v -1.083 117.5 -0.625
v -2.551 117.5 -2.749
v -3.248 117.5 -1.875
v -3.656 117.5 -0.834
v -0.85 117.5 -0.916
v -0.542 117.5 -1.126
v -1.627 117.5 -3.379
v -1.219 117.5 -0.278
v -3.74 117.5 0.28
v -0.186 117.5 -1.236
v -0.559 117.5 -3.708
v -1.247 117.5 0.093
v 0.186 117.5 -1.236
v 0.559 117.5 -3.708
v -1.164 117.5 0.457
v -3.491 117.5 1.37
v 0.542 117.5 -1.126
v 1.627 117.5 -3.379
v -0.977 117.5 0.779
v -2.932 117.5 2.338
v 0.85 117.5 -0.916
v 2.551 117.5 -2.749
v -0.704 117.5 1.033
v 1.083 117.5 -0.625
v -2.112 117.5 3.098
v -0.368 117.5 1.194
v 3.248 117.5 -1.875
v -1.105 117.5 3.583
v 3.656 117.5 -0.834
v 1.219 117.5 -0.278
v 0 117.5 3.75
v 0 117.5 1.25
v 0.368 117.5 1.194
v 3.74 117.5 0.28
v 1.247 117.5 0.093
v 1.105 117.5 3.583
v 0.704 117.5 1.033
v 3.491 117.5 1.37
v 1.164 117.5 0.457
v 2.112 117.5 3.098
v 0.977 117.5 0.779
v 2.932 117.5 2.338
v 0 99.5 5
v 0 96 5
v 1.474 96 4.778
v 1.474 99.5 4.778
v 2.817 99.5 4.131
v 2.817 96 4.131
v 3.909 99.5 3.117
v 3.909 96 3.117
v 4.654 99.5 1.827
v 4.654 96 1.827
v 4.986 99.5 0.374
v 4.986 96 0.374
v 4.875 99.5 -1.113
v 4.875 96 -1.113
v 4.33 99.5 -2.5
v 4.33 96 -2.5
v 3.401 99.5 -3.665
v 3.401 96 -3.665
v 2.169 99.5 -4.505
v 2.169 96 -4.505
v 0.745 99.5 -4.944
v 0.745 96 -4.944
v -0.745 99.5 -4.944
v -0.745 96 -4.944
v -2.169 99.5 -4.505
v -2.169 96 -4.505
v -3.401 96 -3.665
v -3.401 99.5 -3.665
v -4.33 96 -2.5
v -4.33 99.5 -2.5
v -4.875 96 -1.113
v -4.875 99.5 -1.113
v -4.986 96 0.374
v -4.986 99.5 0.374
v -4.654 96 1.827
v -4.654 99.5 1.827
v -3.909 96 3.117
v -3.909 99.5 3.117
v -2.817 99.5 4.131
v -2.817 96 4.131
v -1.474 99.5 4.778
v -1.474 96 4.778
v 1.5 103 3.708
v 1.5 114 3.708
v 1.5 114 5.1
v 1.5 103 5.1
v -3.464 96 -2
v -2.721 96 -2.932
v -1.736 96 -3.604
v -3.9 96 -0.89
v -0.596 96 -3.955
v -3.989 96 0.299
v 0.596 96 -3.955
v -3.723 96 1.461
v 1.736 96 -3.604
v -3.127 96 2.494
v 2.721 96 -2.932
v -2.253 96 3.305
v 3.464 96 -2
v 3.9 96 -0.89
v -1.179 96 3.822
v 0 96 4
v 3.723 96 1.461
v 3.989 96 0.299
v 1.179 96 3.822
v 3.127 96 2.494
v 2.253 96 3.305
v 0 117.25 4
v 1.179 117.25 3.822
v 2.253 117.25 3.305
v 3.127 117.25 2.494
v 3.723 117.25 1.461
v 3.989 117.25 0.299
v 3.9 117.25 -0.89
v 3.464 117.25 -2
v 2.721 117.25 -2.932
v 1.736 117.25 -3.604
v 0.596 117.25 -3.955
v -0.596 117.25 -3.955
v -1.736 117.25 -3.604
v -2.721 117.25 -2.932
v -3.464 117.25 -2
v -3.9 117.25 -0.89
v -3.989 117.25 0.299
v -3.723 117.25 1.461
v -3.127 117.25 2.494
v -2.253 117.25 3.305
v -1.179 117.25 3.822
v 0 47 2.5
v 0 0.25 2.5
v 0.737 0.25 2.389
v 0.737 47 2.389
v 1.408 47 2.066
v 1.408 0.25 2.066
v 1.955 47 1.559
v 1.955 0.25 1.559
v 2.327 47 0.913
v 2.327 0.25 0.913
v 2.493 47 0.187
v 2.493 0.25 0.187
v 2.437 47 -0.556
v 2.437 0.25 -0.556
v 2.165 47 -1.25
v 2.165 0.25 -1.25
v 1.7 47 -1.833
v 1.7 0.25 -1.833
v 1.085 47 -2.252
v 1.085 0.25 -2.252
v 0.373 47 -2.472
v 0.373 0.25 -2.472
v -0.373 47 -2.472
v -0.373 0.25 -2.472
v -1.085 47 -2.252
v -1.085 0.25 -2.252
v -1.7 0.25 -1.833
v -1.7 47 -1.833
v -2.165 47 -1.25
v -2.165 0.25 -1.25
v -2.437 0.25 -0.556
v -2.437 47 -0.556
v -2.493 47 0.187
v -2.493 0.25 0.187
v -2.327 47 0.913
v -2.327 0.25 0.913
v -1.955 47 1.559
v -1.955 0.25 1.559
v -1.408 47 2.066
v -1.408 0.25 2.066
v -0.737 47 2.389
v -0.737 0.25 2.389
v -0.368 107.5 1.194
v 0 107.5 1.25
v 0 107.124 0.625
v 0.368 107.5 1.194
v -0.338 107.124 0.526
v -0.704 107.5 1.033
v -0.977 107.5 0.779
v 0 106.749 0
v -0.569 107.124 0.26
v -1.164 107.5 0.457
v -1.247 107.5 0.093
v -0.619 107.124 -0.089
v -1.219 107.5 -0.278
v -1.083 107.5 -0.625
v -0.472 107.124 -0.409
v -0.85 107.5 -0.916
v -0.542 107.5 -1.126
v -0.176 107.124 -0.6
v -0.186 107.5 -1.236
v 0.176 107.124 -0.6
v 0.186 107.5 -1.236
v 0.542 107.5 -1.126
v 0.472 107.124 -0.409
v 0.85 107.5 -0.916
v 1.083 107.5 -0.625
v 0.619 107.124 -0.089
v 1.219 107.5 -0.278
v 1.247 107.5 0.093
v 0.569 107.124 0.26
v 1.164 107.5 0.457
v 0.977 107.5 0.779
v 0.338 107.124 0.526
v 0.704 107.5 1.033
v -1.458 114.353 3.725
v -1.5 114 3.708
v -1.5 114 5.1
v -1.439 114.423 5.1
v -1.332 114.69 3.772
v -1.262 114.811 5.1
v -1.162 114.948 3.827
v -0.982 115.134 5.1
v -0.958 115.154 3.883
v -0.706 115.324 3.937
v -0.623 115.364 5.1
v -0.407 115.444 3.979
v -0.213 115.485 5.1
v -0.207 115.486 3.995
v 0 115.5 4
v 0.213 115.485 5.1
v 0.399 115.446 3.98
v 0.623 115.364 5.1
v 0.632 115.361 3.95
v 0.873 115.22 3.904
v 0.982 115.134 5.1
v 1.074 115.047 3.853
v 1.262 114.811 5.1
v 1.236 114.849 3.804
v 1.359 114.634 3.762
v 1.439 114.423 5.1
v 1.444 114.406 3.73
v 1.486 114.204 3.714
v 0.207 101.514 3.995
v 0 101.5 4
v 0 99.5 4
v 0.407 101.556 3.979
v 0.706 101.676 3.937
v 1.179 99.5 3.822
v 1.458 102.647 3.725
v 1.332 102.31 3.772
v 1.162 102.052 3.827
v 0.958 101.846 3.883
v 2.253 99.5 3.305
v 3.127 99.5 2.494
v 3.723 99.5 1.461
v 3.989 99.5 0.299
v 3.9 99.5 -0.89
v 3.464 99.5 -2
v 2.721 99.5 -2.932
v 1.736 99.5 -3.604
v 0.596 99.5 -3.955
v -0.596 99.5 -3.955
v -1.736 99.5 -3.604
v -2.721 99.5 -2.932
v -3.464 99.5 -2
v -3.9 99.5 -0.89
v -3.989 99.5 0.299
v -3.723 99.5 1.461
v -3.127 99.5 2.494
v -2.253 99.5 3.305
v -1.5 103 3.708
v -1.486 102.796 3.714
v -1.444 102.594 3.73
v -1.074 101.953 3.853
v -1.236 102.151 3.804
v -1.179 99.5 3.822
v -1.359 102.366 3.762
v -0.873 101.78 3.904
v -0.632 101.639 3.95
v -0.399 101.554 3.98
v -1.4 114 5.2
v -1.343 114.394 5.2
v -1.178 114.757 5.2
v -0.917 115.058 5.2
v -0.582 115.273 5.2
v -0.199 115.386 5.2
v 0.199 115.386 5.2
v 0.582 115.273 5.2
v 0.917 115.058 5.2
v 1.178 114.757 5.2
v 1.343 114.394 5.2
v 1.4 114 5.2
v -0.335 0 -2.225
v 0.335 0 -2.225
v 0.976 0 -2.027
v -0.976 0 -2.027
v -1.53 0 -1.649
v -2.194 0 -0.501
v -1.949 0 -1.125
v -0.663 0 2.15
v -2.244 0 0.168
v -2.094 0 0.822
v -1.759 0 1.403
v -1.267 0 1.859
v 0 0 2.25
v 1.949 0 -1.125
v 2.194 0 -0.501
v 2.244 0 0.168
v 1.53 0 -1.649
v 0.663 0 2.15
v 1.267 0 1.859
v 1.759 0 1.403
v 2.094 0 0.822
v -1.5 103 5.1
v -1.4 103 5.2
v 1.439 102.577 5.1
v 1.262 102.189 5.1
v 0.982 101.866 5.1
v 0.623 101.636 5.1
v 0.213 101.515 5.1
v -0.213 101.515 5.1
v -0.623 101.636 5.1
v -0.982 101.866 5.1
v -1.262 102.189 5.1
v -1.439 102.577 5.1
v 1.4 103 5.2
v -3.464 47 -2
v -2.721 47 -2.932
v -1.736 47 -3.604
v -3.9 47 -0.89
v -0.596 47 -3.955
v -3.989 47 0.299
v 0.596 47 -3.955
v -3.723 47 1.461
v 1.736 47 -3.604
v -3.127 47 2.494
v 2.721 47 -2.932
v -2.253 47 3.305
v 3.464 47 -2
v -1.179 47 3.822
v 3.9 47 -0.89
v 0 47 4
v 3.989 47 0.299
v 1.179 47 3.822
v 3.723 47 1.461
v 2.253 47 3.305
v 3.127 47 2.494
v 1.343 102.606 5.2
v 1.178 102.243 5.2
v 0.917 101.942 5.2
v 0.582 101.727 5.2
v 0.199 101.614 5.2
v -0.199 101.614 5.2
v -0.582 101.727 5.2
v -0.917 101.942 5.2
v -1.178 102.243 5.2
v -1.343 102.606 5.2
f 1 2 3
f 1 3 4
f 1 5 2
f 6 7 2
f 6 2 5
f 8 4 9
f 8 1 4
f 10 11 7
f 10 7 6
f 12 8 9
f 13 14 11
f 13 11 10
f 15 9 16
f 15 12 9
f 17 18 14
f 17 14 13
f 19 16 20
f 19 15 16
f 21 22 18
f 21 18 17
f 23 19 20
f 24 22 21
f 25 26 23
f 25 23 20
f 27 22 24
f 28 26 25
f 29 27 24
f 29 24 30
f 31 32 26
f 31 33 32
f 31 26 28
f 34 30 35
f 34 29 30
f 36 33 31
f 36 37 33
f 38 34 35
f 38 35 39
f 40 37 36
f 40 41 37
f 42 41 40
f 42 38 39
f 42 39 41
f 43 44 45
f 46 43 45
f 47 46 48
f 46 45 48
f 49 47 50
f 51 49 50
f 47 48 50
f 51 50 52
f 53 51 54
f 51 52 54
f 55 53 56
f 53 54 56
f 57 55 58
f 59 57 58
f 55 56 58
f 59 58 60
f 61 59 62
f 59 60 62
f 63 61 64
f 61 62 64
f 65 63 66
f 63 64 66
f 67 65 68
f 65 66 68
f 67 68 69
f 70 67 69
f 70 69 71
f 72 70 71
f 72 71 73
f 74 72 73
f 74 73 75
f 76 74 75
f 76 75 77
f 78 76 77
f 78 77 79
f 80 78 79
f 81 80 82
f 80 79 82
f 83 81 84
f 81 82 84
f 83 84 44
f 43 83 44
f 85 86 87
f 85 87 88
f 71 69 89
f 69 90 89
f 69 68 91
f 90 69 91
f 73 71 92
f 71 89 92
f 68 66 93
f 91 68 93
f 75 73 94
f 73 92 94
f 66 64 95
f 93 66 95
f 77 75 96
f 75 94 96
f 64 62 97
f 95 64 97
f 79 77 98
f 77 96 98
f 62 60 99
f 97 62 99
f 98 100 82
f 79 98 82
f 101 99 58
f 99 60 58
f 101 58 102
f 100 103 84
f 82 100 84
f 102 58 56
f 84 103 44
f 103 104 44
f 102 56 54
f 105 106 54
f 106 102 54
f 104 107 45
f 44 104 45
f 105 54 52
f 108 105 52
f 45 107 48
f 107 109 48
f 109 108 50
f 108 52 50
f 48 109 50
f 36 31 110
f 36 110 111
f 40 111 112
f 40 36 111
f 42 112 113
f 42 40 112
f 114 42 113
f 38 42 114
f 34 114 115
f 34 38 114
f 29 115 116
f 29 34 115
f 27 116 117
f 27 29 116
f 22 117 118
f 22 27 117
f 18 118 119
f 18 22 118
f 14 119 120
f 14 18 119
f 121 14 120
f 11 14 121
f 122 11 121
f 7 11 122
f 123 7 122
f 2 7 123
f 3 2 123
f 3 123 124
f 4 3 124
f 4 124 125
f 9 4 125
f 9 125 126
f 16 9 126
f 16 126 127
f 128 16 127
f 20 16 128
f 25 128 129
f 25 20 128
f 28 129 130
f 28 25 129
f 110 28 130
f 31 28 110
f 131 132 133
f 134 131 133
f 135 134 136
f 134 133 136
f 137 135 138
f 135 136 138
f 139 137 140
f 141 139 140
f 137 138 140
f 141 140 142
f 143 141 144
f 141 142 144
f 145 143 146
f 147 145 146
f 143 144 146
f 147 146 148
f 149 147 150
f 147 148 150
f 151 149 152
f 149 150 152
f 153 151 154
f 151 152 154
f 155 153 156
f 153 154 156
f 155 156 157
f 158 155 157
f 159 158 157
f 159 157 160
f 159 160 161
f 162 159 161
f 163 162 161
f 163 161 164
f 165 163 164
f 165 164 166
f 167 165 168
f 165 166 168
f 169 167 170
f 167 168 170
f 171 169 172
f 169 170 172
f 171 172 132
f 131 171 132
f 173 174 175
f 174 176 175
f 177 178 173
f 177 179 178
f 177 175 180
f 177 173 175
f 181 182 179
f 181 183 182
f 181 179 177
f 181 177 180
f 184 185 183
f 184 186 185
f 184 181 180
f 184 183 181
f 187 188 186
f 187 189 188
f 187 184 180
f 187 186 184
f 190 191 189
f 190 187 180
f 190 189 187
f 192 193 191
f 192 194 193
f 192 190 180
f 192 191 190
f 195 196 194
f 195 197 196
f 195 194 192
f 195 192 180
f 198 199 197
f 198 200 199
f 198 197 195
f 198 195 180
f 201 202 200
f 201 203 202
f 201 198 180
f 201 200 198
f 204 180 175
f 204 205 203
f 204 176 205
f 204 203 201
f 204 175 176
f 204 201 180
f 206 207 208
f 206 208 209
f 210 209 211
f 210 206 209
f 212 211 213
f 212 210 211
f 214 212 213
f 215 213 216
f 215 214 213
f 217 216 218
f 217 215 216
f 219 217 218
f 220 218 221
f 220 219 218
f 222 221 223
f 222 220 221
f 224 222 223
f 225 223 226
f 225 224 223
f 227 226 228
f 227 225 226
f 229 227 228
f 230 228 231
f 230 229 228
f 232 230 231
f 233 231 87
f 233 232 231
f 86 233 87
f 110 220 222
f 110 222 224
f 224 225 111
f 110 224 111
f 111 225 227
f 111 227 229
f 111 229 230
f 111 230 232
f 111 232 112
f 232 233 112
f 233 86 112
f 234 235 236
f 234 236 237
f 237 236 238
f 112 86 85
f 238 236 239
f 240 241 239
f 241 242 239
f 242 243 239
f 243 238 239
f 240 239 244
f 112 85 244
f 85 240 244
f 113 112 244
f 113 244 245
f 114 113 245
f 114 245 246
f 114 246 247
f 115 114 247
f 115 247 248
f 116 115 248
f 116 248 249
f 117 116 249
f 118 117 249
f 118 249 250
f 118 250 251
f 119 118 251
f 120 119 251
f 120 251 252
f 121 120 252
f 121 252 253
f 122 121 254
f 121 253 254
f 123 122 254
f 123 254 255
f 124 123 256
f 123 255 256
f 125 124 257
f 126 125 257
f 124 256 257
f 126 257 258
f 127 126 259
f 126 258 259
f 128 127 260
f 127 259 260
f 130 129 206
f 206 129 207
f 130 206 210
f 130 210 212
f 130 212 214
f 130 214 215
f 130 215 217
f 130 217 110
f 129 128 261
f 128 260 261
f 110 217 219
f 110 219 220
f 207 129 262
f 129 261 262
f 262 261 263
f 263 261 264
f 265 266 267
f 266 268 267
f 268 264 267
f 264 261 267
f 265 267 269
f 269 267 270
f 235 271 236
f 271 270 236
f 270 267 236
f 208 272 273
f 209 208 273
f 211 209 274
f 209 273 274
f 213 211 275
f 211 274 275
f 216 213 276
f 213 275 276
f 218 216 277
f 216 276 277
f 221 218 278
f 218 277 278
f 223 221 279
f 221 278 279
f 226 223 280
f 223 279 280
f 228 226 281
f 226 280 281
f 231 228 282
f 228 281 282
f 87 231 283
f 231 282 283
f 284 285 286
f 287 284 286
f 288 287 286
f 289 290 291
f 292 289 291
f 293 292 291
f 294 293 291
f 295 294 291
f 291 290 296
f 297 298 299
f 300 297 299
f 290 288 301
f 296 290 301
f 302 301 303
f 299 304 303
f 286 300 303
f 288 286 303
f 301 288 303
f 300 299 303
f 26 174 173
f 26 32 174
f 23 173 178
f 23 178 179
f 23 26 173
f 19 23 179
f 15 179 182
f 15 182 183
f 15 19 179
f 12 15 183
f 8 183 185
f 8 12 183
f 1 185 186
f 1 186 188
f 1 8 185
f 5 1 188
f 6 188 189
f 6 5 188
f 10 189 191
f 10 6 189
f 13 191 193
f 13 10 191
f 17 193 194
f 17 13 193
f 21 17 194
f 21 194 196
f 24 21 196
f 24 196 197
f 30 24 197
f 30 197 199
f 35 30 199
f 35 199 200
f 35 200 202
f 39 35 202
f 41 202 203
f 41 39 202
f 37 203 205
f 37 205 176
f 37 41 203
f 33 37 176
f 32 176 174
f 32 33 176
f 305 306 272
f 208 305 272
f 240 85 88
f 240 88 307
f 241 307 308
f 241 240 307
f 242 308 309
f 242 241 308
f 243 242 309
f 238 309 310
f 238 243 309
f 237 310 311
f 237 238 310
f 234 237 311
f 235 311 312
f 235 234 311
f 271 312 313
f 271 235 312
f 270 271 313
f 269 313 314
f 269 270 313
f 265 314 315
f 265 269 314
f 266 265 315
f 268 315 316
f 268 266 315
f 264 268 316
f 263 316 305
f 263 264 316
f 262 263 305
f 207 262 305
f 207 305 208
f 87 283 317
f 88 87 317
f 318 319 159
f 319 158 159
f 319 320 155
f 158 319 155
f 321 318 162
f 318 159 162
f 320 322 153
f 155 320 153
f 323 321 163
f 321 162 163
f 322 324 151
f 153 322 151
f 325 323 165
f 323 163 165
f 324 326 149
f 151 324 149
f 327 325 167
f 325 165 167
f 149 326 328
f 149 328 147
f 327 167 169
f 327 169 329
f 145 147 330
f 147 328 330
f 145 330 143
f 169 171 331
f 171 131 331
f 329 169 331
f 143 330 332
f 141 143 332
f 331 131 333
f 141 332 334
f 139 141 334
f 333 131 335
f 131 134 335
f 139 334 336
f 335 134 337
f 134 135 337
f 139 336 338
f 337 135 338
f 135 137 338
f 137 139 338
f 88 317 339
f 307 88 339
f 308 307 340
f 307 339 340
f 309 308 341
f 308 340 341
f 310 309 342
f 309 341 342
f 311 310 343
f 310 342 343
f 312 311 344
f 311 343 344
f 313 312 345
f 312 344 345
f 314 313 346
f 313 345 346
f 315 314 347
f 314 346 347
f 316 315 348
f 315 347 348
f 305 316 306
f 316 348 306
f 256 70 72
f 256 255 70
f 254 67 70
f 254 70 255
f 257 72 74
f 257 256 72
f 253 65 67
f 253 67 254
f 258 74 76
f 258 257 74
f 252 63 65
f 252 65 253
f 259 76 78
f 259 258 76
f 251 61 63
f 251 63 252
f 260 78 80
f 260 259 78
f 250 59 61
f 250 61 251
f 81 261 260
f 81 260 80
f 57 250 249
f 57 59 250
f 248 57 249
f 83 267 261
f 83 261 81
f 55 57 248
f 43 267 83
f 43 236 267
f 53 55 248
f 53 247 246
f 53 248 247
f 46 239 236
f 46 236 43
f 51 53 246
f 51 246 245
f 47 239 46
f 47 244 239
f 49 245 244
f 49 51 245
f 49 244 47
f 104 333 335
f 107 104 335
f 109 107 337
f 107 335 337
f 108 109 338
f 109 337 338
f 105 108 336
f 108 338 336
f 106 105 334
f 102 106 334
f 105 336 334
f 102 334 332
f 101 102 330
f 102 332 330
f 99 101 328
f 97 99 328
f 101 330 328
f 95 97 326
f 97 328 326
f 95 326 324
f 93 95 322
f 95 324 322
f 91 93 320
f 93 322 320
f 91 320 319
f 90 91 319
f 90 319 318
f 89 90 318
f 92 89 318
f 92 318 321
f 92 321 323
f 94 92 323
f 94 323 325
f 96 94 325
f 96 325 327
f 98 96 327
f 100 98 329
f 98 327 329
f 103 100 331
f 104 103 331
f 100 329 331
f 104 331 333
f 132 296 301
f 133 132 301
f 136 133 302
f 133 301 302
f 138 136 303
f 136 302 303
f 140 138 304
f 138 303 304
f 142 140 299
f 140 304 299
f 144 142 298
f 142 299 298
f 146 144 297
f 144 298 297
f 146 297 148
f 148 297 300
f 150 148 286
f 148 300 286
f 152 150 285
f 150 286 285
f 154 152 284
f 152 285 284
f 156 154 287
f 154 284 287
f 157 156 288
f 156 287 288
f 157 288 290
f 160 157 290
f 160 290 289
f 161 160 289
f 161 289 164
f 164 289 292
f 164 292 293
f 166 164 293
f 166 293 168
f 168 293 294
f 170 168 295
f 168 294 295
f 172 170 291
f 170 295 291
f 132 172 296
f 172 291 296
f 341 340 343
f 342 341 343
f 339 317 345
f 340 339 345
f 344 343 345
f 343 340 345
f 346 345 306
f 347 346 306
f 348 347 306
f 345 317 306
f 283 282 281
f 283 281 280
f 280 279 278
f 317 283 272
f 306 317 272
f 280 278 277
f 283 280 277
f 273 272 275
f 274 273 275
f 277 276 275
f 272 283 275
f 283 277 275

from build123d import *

# Parameters (mm, degrees)
SKETCH_1_R      = 2.5
EXTRUDE_1_DEPTH = 47
EXTRUDE_START   = 47
SKETCH_2_R      = 4
EXTRUDE_2_DEPTH = 49
EXTRUDE_START_2 = 96
SKETCH_3_R      = 5
EXTRUDE_3_DEPTH = 3.5
EXTRUDE_START_3 = 99.5
SKETCH_4_R      = 4
EXTRUDE_4_DEPTH = 18
EXTRUDE_START_4 = 2.2
EXTRUDE_5_DEPTH = 3
CHAMFER_1_SIZE  = 0.25
CHAMFER_2_SIZE  = 0.1


with BuildPart() as part:
    # 草图1 → 凸台-拉伸1 (new body)
    with BuildSketch(Plane(origin=(0, 0, 0), x_dir=(1, 0, 0), z_dir=(0, 1, 0))):
        with Locations(Location((0, 0, 0), (0, 0, 270))):
            Circle(SKETCH_1_R)
    extrude(amount=EXTRUDE_1_DEPTH)

    # 草图2 → 凸台-拉伸2 (add)
    with BuildSketch(Plane(origin=(0, 0, 0), x_dir=(1, 0, 0), z_dir=(0, 1, 0)).offset(EXTRUDE_START)):
        with Locations(Location((0, 0, 0), (0, 0, 270))):
            Circle(SKETCH_2_R)
    extrude(amount=EXTRUDE_2_DEPTH)

    # 草图3 → 凸台-拉伸3 (add)
    with BuildSketch(Plane(origin=(0, 0, 0), x_dir=(1, 0, 0), z_dir=(0, 1, 0)).offset(EXTRUDE_START_2)):
        with Locations(Location((0, 0, 0), (0, 0, 270))):
            Circle(SKETCH_3_R)
    extrude(amount=EXTRUDE_3_DEPTH)

    # 草图4 → 凸台-拉伸4 (add)
    with BuildSketch(Plane(origin=(0, 0, 0), x_dir=(1, 0, 0), z_dir=(0, 1, 0)).offset(EXTRUDE_START_3)):
        with Locations(Location((0, 0, 0), (0, 0, 270))):
            Circle(SKETCH_4_R)
    extrude(amount=EXTRUDE_4_DEPTH)

    # 草图9 → M3 螺纹孔1 (revolve, cut)
    with BuildSketch(Plane(origin=(0, 117.5, 0), x_dir=(0, 0, 1), z_dir=(1, 0, 0))):
        Polygon((0, 0), (0, 10.751075774), (1.25, 10), (1.25, 0), align=None)
    revolve(axis=Axis((0, 123.85, 0), (0, -1, 0)), mode=Mode.SUBTRACT)

    # 草图11 → 凸台-拉伸5 (add)
    with BuildSketch(Plane.XY.offset(EXTRUDE_START_4)):
        with BuildLine():
            Line((-1.5, 103), (-1.5, 114))
            ThreePointArc((-1.5, 114), (0, 115.5), (1.5, 114))
            Line((1.5, 114), (1.5, 103))
            ThreePointArc((1.5, 103), (0, 101.5), (-1.5, 103))
        make_face()
    extrude(amount=EXTRUDE_5_DEPTH)

    # 倒角1
    chamfer_1_edges = [part.edges().sort_by_distance(p)[0] for p in [
        (0, 117.5, -4),
        (0, 0, -2.5),
    ]]
    chamfer(chamfer_1_edges, length=CHAMFER_1_SIZE)

    # 倒角2
    chamfer_2_edges = [part.edges().sort_by_distance(p)[0] for p in [
        (0, 101.5, 5.2),
        (1.5, 108.5, 5.2),
        (0, 115.5, 5.2),
        (-1.5, 108.5, 5.2),
    ]]
    chamfer(chamfer_2_edges, length=CHAMFER_2_SIZE)


solid = part.part
